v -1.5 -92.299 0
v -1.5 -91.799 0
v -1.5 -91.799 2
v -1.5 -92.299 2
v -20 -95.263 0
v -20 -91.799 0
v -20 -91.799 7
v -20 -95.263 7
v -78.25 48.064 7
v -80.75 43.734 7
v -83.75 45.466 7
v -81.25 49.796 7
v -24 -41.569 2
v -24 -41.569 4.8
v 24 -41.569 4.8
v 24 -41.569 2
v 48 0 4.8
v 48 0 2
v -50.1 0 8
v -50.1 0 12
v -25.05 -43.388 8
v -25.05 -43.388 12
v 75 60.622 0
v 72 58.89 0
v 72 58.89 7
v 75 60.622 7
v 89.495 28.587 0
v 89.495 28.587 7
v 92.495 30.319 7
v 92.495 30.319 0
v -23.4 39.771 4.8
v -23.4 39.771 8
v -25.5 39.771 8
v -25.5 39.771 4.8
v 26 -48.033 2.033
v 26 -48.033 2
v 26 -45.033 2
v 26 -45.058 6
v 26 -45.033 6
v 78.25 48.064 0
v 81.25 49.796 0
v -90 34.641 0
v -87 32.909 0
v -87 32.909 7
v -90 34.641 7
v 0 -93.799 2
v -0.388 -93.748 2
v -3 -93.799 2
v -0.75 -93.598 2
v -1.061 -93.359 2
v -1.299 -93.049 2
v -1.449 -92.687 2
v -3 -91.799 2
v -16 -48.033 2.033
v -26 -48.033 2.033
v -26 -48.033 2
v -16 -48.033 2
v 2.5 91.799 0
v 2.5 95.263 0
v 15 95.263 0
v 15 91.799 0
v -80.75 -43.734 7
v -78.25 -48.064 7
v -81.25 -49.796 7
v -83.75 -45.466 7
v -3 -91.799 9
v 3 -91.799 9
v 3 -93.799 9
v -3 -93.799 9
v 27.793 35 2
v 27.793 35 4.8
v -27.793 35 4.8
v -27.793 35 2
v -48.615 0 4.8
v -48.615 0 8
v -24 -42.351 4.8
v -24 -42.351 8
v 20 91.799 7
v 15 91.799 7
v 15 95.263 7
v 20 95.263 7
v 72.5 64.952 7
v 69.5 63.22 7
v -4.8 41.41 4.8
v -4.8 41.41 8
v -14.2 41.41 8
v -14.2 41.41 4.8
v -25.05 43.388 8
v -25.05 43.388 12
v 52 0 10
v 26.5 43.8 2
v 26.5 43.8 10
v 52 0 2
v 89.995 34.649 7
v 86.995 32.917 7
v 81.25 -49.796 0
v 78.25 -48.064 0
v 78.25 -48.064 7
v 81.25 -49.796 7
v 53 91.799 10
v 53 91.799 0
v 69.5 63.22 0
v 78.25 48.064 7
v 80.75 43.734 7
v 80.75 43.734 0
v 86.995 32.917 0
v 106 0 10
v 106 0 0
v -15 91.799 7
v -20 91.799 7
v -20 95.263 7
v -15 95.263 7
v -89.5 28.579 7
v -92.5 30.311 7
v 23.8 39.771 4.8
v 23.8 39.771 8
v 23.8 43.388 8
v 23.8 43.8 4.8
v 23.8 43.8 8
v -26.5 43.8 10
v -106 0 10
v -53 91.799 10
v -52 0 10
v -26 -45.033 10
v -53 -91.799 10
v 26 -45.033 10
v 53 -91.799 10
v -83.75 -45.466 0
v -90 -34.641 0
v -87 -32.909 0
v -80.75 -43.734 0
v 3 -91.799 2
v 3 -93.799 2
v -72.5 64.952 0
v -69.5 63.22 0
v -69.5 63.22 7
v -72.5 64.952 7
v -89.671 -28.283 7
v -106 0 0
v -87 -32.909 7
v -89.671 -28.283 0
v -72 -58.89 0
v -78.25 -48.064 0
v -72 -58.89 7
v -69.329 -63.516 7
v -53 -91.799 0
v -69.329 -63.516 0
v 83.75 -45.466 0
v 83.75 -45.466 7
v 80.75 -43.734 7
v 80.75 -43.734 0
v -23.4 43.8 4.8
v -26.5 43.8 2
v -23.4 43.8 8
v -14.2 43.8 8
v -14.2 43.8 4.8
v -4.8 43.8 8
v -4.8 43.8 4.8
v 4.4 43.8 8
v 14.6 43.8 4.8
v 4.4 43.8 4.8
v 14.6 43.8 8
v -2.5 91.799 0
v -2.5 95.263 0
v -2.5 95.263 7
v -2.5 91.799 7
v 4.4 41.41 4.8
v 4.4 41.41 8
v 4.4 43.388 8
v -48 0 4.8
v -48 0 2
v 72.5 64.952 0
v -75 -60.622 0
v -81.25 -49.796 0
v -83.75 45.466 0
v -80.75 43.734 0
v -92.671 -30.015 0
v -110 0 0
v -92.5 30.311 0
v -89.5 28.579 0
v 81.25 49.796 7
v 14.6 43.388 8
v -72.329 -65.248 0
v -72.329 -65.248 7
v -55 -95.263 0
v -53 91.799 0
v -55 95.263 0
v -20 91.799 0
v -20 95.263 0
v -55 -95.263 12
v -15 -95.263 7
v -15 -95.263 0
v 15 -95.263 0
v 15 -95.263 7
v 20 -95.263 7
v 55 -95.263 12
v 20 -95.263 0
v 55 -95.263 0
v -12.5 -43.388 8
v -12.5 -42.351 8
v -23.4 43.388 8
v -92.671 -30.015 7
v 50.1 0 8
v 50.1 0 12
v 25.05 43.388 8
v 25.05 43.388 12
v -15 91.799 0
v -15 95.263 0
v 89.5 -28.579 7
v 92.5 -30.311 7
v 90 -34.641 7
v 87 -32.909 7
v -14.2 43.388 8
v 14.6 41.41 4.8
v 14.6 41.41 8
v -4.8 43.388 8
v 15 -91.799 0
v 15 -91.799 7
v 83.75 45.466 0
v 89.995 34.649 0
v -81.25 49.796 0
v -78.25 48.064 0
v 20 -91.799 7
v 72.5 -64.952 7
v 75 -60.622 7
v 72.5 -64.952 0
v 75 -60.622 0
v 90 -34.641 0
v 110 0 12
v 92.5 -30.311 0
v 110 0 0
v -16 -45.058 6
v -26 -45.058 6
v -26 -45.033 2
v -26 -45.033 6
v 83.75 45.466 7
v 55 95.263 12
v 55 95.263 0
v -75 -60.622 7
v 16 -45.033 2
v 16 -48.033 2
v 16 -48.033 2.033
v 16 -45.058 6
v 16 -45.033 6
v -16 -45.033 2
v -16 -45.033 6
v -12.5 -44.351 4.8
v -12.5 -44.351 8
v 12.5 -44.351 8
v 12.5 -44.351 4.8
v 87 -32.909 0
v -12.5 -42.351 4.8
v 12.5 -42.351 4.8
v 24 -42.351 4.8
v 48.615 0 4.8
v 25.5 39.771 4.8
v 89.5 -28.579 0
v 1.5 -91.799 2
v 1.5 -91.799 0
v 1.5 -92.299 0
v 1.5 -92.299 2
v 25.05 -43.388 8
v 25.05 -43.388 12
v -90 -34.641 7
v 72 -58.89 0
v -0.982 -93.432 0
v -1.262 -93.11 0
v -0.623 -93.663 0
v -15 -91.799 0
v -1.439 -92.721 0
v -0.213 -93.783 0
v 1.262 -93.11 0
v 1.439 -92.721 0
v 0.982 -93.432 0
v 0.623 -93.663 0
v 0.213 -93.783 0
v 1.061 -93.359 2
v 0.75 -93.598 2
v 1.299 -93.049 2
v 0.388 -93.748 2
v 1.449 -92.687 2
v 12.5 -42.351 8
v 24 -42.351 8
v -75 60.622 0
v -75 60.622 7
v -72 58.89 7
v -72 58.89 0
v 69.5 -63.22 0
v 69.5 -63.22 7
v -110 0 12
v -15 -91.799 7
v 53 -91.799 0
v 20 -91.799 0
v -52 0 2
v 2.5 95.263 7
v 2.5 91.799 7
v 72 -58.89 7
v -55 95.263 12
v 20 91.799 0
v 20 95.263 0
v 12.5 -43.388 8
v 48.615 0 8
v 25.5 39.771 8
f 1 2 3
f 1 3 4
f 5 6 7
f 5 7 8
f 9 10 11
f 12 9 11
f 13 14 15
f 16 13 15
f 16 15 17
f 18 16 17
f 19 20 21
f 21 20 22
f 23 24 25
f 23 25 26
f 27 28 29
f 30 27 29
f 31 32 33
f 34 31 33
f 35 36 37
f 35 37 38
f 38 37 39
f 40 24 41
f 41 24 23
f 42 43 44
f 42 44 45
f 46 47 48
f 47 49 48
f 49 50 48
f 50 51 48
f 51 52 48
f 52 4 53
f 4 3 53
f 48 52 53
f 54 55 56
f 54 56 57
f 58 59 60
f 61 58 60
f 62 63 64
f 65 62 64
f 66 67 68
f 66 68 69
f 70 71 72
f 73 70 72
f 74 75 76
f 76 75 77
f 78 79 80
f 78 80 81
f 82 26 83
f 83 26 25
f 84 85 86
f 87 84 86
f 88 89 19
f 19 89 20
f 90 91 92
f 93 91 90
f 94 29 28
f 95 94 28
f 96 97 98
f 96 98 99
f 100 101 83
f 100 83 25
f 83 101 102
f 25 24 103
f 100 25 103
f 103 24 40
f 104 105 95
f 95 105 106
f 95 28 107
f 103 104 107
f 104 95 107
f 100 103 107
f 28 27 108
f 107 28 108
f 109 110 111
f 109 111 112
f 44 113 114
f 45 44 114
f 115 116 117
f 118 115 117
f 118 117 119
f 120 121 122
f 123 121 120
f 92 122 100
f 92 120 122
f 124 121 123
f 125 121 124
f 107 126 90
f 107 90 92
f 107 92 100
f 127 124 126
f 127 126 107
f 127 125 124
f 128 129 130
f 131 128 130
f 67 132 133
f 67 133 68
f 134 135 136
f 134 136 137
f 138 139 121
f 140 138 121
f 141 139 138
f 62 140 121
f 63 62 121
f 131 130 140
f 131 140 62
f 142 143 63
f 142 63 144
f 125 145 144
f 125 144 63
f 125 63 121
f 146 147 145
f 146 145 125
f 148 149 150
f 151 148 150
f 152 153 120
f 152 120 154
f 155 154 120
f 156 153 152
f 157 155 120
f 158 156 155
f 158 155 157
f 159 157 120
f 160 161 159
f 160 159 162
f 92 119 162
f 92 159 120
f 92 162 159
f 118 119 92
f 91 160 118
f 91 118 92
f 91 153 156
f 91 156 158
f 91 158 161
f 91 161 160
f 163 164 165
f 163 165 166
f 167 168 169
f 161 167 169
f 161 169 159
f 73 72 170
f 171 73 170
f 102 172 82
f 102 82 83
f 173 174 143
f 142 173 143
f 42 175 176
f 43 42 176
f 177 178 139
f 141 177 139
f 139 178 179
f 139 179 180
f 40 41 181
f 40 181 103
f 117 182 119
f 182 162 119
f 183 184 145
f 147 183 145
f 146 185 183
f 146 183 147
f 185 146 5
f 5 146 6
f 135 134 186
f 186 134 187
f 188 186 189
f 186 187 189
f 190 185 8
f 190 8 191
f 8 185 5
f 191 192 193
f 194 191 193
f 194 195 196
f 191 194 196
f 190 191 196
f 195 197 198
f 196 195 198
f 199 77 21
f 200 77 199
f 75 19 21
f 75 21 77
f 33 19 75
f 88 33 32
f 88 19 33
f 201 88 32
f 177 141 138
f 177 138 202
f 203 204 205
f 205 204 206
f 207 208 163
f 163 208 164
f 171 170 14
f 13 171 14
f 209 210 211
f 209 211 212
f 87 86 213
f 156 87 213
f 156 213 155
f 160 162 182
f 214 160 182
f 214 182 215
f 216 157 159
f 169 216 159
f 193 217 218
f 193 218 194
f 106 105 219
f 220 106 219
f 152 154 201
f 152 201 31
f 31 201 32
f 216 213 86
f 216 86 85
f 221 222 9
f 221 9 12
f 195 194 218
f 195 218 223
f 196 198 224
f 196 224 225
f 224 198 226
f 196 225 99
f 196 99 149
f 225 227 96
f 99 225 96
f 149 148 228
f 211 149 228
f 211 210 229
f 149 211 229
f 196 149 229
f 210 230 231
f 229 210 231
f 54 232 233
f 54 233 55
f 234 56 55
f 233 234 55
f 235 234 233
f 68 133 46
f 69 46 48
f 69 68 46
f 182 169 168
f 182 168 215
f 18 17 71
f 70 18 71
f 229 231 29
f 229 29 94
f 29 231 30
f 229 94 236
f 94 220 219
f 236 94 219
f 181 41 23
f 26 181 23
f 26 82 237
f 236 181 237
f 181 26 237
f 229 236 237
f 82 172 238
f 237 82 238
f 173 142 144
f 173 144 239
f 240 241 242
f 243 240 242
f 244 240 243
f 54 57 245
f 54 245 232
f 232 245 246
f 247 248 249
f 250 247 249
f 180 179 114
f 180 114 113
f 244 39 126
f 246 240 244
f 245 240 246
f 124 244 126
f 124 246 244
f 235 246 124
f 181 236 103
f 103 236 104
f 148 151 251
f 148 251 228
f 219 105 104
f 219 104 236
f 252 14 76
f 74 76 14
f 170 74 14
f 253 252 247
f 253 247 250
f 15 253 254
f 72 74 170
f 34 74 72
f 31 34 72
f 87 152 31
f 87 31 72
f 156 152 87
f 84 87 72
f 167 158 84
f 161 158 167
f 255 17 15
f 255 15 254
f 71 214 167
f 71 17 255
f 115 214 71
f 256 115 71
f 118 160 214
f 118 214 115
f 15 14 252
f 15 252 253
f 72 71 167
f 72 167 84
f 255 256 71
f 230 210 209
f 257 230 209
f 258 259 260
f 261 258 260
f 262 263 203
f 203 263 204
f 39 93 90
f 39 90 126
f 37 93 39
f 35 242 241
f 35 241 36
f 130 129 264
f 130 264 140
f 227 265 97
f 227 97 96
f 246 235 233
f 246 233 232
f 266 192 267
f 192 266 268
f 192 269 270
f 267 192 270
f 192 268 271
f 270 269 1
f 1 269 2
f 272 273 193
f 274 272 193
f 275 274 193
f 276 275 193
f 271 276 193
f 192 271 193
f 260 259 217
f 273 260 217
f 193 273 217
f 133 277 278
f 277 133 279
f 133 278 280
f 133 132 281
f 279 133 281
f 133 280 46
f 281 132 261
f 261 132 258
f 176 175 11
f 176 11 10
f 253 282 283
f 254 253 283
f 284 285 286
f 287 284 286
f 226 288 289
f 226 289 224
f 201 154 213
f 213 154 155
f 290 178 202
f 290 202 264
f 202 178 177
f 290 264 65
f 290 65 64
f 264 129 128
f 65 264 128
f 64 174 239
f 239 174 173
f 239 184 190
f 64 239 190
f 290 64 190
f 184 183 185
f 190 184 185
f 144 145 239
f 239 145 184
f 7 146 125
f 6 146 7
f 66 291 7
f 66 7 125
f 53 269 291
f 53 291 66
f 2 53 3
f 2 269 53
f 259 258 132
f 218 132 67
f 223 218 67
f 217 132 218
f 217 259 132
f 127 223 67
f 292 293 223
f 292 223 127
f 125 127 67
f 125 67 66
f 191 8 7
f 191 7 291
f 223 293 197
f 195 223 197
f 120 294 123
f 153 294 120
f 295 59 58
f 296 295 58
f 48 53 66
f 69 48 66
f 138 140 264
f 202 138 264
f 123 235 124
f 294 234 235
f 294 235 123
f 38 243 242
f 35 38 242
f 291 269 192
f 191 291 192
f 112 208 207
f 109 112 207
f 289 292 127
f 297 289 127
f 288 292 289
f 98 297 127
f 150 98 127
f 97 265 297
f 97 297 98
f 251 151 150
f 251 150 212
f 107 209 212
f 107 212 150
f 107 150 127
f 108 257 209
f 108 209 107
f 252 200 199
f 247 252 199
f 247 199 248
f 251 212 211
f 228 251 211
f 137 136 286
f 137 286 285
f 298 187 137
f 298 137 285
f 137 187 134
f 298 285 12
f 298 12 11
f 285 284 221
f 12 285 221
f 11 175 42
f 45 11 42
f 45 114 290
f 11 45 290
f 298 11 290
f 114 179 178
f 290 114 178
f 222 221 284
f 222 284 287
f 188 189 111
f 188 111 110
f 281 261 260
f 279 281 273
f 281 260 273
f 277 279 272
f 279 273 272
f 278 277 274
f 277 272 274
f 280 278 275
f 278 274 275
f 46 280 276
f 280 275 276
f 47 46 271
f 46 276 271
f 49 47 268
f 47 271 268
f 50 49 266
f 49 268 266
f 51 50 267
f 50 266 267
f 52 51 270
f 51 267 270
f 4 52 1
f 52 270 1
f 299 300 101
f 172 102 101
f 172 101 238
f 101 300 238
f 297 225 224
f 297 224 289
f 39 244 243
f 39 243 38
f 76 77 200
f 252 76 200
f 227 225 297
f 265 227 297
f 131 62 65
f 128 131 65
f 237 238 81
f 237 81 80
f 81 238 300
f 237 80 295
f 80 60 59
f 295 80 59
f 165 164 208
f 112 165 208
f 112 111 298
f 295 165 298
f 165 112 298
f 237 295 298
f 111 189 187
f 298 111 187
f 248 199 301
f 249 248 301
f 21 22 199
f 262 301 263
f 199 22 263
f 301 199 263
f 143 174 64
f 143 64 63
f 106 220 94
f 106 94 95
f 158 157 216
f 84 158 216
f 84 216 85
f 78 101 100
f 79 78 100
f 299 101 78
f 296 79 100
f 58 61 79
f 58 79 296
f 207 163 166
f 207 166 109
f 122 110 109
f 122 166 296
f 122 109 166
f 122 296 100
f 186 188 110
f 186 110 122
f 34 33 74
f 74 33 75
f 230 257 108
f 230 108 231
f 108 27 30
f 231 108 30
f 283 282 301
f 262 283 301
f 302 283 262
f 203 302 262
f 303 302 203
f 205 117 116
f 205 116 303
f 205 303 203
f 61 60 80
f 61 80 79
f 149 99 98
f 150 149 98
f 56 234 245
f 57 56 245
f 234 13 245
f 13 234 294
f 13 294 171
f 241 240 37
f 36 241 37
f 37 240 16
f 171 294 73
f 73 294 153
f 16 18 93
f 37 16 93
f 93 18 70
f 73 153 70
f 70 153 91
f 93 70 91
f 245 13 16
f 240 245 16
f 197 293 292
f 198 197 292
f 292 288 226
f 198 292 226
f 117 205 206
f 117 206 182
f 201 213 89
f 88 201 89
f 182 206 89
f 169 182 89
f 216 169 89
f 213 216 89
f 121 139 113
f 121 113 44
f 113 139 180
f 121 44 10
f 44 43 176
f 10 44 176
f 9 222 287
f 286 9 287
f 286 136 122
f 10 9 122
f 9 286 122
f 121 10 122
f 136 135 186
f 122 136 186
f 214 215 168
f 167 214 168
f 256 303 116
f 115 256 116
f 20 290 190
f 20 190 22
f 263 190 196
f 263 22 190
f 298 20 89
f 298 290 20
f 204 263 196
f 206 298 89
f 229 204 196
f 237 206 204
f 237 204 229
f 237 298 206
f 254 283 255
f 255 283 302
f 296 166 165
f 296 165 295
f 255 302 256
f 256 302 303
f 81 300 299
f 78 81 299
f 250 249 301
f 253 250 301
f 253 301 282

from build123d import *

# Parameters (mm, degrees)
PAD_DEPTH       = 12
POCKET_DEPTH    = 4
POCKET001_DEPTH = 2
POCKET002_DEPTH = 3.2
POCKET003_DEPTH = 5
POCKET004_DEPTH = 8
SKETCH007_W     = 6
SKETCH007_H     = 7
POCKET005_DEPTH = 2
SKETCH008_W     = 5
SKETCH008_H     = 6
SKETCH008_H_2   = 5.175393
POCKET006_DEPTH = 7
SKETCH009_W     = 10
SKETCH009_H     = 4
PAD001_DEPTH    = 3
POCKET007_DEPTH = 52


with BuildPart() as part:
    # Sketch → Pad (new body)
    with BuildSketch(Plane.XY):
        Polygon((-110, 0), (-55, -95.262794), (55, -95.262794), (110, 0), (55, 95.262794), (-55, 95.262794), align=None)
    extrude(amount=PAD_DEPTH)

    # Sketch001 (on Face8 of Pad) → Pocket (cut)
    with BuildSketch(Plane.XY.offset(12)):
        Polygon((-50.1, 0), (-25.05, -43.387873), (25.05, -43.387873), (50.1, 0), (25.05, 43.387873), (-25.05, 43.387873), align=None)
    extrude(amount=-POCKET_DEPTH, mode=Mode.SUBTRACT)

    # Sketch002 (on Face4 of Pocket) → Pocket001 (cut)
    with BuildSketch(Plane(origin=(0, 0, 0), x_dir=(1, 0, 0), z_dir=(0, 0, -1))):
        with BuildLine():
            Line((-106, 0), (-53, -91.798693))
            Line((53, -91.798693), (-53, -91.798693))
            Line((53, -91.798693), (106, 0))
            Line((53, 91.798693), (106, 0))
            Line((1.5, 91.798693), (53, 91.798693))
            Line((1.5, 91.798693), (1.5, 92.298693))
            ThreePointArc((1.5, 92.298693), (0, 93.798693), (-1.5, 92.298693))
            Line((-1.5, 91.798693), (-1.5, 92.298693))
            Line((-53, 91.798693), (-1.5, 91.798693))
            Line((-106, 0), (-53, 91.798693))
        make_face()
    extrude(amount=-POCKET001_DEPTH, mode=Mode.SUBTRACT)

    # Sketch003 (on Face26 of Pocket001) → Pocket002 (cut)
    with BuildSketch(Plane.XY.offset(8)):
        Polygon((-48.615, 0), (-24, -42.351379), (-12.5, -42.351379), (-12.5, -44.351379), (12.5, -44.351379), (12.5, -42.351379), (24, -42.351379), (48.615, 0), (25.5, 39.770552), (23.8, 39.770552), (23.8, 44.21), (14.6, 44.21), (14.6, 41.41), (4.4, 41.41), (4.4, 44.21), (-4.8, 44.21), (-4.8, 41.41), (-14.2, 41.41), (-14.2, 44.21), (-23.4, 44.21), (-23.4, 39.770552), (-25.5, 39.770552), align=None)
    extrude(amount=-POCKET002_DEPTH, mode=Mode.SUBTRACT)

    # Sketch005 (on Face56 of Pocket002) → Pocket003 (cut)
    with BuildSketch(Plane.XY.offset(4.8)):
        Polygon((-24, -41.569219), (24, -41.569219), (48, 0), (27.792741, 35), (-27.792741, 35), (-48, 0), align=None)
    extrude(amount=-POCKET003_DEPTH, mode=Mode.SUBTRACT)

    # Sketch006 (on Face25 of Pocket003) → Pocket004 (cut)
    with BuildSketch(Plane(origin=(0, 0, 2), x_dir=(1, 0, 0), z_dir=(0, 0, -1))):
        Polygon((106, 0), (53, 91.798693), (-53, 91.798693), (-106, 0), (-53, -91.798693), (53, -91.798693), align=None)
        Polygon((-26.5, -43.8), (26.5, -43.8), (52, 0), (26, 45.033321), (-26, 45.033321), (-52, 0), align=None, mode=Mode.SUBTRACT)
    extrude(amount=-POCKET004_DEPTH, mode=Mode.SUBTRACT)

    # Sketch007 (on Face14 of Pocket004) → Pocket005 (cut)
    with BuildSketch(Plane(origin=(0, -91.798693, 0), x_dir=(-1, 0, 0), z_dir=(0, 1, 0))):
        with Locations((0, 5.5)):
            Rectangle(SKETCH007_W, SKETCH007_H)
    extrude(amount=-POCKET005_DEPTH, mode=Mode.SUBTRACT)

    # Sketch008 (on Face4 of Pocket005) → Pocket006 (cut)
    with BuildSketch(Plane(origin=(0, 0, 0), x_dir=(1, 0, 0), z_dir=(0, 0, -1))):
        with Locations((-17.5, -93.155396)):
            Rectangle(SKETCH008_W, SKETCH008_H)
        with Locations((17.5, -93.155396)):
            Rectangle(SKETCH008_W, SKETCH008_H)
        with Locations((-17.5, 92.844604)):
            Rectangle(SKETCH008_W, SKETCH008_H)
        with Locations((17.5, 92.844604)):
            Rectangle(SKETCH008_W, SKETCH008_H)
        Polygon((72.943614, -65.208026), (67.747462, -62.208026), (70.247462, -57.877899), (75.443614, -60.877899), align=None)
        Polygon((91.08198, -35.276307), (85.885827, -32.276307), (88.385827, -27.94618), (93.58198, -30.94618), align=None)
        Polygon((-88.307892, 27.495521), (-93.504045, 30.495521), (-90.832982, 35.121938), (-85.636829, 32.121938), align=None)
        Polygon((-70.637333, 58.102991), (-75.833485, 61.102991), (-73.162422, 65.729408), (-67.96627, 62.729408), align=None)
        Polygon((68.025973, 62.368825), (73.222126, 65.368825), (75.722126, 61.038698), (70.525973, 58.038698), align=None)
        Polygon((85.525973, 32.057936), (90.722126, 35.057936), (93.222126, 30.727809), (88.025973, 27.727809), align=None)
        Polygon((-93.477396, -30.875189), (-88.281244, -27.875189), (-85.781244, -32.205316), (-90.977396, -35.205316), align=None)
        Polygon((-75.942627, -61.165973), (-70.746474, -58.165973), (-68.246474, -62.4961), (-73.442627, -65.4961), align=None)
        with Locations((0, -93.5677)):
            Rectangle(SKETCH008_W, SKETCH008_H_2)
        Polygon((-85.225594, -46.318269), (-80.029442, -43.318269), (-77.529442, -47.648396), (-82.725594, -50.648396), align=None)
        Polygon((76.42707, 47.011941), (81.623222, 50.011941), (84.123222, 45.681814), (78.92707, 42.681814), align=None)
        Polygon((-79.184311, 42.830332), (-84.380464, 45.830332), (-81.880464, 50.160459), (-76.684311, 47.160459), align=None)
        Polygon((82.868303, -50.730789), (77.672151, -47.730789), (80.172151, -43.400661), (85.368303, -46.400661), align=None)
    extrude(amount=-POCKET006_DEPTH, mode=Mode.SUBTRACT)

    # Sketch009 (on Face116 of Pocket006) → Pad001 (join)
    with BuildSketch(Plane.XZ.offset(45.033321)):
        with Locations((-21, 4)):
            Rectangle(SKETCH009_W, SKETCH009_H)
        with Locations((21, 4)):
            Rectangle(SKETCH009_W, SKETCH009_H)
    extrude(amount=PAD001_DEPTH)

    # Sketch010 (on Face155 of Pad001) → Pocket007 (cut)
    with BuildSketch(Plane(origin=(-26, 0, 0), x_dir=(0, -1, 0), z_dir=(-1, 0, 0))):
        Polygon((45.049209, 6.011785), (48.049209, 2.011785), (48.049209, 6.011785), align=None)
    extrude(amount=-POCKET007_DEPTH, mode=Mode.SUBTRACT)


solid = part.part
